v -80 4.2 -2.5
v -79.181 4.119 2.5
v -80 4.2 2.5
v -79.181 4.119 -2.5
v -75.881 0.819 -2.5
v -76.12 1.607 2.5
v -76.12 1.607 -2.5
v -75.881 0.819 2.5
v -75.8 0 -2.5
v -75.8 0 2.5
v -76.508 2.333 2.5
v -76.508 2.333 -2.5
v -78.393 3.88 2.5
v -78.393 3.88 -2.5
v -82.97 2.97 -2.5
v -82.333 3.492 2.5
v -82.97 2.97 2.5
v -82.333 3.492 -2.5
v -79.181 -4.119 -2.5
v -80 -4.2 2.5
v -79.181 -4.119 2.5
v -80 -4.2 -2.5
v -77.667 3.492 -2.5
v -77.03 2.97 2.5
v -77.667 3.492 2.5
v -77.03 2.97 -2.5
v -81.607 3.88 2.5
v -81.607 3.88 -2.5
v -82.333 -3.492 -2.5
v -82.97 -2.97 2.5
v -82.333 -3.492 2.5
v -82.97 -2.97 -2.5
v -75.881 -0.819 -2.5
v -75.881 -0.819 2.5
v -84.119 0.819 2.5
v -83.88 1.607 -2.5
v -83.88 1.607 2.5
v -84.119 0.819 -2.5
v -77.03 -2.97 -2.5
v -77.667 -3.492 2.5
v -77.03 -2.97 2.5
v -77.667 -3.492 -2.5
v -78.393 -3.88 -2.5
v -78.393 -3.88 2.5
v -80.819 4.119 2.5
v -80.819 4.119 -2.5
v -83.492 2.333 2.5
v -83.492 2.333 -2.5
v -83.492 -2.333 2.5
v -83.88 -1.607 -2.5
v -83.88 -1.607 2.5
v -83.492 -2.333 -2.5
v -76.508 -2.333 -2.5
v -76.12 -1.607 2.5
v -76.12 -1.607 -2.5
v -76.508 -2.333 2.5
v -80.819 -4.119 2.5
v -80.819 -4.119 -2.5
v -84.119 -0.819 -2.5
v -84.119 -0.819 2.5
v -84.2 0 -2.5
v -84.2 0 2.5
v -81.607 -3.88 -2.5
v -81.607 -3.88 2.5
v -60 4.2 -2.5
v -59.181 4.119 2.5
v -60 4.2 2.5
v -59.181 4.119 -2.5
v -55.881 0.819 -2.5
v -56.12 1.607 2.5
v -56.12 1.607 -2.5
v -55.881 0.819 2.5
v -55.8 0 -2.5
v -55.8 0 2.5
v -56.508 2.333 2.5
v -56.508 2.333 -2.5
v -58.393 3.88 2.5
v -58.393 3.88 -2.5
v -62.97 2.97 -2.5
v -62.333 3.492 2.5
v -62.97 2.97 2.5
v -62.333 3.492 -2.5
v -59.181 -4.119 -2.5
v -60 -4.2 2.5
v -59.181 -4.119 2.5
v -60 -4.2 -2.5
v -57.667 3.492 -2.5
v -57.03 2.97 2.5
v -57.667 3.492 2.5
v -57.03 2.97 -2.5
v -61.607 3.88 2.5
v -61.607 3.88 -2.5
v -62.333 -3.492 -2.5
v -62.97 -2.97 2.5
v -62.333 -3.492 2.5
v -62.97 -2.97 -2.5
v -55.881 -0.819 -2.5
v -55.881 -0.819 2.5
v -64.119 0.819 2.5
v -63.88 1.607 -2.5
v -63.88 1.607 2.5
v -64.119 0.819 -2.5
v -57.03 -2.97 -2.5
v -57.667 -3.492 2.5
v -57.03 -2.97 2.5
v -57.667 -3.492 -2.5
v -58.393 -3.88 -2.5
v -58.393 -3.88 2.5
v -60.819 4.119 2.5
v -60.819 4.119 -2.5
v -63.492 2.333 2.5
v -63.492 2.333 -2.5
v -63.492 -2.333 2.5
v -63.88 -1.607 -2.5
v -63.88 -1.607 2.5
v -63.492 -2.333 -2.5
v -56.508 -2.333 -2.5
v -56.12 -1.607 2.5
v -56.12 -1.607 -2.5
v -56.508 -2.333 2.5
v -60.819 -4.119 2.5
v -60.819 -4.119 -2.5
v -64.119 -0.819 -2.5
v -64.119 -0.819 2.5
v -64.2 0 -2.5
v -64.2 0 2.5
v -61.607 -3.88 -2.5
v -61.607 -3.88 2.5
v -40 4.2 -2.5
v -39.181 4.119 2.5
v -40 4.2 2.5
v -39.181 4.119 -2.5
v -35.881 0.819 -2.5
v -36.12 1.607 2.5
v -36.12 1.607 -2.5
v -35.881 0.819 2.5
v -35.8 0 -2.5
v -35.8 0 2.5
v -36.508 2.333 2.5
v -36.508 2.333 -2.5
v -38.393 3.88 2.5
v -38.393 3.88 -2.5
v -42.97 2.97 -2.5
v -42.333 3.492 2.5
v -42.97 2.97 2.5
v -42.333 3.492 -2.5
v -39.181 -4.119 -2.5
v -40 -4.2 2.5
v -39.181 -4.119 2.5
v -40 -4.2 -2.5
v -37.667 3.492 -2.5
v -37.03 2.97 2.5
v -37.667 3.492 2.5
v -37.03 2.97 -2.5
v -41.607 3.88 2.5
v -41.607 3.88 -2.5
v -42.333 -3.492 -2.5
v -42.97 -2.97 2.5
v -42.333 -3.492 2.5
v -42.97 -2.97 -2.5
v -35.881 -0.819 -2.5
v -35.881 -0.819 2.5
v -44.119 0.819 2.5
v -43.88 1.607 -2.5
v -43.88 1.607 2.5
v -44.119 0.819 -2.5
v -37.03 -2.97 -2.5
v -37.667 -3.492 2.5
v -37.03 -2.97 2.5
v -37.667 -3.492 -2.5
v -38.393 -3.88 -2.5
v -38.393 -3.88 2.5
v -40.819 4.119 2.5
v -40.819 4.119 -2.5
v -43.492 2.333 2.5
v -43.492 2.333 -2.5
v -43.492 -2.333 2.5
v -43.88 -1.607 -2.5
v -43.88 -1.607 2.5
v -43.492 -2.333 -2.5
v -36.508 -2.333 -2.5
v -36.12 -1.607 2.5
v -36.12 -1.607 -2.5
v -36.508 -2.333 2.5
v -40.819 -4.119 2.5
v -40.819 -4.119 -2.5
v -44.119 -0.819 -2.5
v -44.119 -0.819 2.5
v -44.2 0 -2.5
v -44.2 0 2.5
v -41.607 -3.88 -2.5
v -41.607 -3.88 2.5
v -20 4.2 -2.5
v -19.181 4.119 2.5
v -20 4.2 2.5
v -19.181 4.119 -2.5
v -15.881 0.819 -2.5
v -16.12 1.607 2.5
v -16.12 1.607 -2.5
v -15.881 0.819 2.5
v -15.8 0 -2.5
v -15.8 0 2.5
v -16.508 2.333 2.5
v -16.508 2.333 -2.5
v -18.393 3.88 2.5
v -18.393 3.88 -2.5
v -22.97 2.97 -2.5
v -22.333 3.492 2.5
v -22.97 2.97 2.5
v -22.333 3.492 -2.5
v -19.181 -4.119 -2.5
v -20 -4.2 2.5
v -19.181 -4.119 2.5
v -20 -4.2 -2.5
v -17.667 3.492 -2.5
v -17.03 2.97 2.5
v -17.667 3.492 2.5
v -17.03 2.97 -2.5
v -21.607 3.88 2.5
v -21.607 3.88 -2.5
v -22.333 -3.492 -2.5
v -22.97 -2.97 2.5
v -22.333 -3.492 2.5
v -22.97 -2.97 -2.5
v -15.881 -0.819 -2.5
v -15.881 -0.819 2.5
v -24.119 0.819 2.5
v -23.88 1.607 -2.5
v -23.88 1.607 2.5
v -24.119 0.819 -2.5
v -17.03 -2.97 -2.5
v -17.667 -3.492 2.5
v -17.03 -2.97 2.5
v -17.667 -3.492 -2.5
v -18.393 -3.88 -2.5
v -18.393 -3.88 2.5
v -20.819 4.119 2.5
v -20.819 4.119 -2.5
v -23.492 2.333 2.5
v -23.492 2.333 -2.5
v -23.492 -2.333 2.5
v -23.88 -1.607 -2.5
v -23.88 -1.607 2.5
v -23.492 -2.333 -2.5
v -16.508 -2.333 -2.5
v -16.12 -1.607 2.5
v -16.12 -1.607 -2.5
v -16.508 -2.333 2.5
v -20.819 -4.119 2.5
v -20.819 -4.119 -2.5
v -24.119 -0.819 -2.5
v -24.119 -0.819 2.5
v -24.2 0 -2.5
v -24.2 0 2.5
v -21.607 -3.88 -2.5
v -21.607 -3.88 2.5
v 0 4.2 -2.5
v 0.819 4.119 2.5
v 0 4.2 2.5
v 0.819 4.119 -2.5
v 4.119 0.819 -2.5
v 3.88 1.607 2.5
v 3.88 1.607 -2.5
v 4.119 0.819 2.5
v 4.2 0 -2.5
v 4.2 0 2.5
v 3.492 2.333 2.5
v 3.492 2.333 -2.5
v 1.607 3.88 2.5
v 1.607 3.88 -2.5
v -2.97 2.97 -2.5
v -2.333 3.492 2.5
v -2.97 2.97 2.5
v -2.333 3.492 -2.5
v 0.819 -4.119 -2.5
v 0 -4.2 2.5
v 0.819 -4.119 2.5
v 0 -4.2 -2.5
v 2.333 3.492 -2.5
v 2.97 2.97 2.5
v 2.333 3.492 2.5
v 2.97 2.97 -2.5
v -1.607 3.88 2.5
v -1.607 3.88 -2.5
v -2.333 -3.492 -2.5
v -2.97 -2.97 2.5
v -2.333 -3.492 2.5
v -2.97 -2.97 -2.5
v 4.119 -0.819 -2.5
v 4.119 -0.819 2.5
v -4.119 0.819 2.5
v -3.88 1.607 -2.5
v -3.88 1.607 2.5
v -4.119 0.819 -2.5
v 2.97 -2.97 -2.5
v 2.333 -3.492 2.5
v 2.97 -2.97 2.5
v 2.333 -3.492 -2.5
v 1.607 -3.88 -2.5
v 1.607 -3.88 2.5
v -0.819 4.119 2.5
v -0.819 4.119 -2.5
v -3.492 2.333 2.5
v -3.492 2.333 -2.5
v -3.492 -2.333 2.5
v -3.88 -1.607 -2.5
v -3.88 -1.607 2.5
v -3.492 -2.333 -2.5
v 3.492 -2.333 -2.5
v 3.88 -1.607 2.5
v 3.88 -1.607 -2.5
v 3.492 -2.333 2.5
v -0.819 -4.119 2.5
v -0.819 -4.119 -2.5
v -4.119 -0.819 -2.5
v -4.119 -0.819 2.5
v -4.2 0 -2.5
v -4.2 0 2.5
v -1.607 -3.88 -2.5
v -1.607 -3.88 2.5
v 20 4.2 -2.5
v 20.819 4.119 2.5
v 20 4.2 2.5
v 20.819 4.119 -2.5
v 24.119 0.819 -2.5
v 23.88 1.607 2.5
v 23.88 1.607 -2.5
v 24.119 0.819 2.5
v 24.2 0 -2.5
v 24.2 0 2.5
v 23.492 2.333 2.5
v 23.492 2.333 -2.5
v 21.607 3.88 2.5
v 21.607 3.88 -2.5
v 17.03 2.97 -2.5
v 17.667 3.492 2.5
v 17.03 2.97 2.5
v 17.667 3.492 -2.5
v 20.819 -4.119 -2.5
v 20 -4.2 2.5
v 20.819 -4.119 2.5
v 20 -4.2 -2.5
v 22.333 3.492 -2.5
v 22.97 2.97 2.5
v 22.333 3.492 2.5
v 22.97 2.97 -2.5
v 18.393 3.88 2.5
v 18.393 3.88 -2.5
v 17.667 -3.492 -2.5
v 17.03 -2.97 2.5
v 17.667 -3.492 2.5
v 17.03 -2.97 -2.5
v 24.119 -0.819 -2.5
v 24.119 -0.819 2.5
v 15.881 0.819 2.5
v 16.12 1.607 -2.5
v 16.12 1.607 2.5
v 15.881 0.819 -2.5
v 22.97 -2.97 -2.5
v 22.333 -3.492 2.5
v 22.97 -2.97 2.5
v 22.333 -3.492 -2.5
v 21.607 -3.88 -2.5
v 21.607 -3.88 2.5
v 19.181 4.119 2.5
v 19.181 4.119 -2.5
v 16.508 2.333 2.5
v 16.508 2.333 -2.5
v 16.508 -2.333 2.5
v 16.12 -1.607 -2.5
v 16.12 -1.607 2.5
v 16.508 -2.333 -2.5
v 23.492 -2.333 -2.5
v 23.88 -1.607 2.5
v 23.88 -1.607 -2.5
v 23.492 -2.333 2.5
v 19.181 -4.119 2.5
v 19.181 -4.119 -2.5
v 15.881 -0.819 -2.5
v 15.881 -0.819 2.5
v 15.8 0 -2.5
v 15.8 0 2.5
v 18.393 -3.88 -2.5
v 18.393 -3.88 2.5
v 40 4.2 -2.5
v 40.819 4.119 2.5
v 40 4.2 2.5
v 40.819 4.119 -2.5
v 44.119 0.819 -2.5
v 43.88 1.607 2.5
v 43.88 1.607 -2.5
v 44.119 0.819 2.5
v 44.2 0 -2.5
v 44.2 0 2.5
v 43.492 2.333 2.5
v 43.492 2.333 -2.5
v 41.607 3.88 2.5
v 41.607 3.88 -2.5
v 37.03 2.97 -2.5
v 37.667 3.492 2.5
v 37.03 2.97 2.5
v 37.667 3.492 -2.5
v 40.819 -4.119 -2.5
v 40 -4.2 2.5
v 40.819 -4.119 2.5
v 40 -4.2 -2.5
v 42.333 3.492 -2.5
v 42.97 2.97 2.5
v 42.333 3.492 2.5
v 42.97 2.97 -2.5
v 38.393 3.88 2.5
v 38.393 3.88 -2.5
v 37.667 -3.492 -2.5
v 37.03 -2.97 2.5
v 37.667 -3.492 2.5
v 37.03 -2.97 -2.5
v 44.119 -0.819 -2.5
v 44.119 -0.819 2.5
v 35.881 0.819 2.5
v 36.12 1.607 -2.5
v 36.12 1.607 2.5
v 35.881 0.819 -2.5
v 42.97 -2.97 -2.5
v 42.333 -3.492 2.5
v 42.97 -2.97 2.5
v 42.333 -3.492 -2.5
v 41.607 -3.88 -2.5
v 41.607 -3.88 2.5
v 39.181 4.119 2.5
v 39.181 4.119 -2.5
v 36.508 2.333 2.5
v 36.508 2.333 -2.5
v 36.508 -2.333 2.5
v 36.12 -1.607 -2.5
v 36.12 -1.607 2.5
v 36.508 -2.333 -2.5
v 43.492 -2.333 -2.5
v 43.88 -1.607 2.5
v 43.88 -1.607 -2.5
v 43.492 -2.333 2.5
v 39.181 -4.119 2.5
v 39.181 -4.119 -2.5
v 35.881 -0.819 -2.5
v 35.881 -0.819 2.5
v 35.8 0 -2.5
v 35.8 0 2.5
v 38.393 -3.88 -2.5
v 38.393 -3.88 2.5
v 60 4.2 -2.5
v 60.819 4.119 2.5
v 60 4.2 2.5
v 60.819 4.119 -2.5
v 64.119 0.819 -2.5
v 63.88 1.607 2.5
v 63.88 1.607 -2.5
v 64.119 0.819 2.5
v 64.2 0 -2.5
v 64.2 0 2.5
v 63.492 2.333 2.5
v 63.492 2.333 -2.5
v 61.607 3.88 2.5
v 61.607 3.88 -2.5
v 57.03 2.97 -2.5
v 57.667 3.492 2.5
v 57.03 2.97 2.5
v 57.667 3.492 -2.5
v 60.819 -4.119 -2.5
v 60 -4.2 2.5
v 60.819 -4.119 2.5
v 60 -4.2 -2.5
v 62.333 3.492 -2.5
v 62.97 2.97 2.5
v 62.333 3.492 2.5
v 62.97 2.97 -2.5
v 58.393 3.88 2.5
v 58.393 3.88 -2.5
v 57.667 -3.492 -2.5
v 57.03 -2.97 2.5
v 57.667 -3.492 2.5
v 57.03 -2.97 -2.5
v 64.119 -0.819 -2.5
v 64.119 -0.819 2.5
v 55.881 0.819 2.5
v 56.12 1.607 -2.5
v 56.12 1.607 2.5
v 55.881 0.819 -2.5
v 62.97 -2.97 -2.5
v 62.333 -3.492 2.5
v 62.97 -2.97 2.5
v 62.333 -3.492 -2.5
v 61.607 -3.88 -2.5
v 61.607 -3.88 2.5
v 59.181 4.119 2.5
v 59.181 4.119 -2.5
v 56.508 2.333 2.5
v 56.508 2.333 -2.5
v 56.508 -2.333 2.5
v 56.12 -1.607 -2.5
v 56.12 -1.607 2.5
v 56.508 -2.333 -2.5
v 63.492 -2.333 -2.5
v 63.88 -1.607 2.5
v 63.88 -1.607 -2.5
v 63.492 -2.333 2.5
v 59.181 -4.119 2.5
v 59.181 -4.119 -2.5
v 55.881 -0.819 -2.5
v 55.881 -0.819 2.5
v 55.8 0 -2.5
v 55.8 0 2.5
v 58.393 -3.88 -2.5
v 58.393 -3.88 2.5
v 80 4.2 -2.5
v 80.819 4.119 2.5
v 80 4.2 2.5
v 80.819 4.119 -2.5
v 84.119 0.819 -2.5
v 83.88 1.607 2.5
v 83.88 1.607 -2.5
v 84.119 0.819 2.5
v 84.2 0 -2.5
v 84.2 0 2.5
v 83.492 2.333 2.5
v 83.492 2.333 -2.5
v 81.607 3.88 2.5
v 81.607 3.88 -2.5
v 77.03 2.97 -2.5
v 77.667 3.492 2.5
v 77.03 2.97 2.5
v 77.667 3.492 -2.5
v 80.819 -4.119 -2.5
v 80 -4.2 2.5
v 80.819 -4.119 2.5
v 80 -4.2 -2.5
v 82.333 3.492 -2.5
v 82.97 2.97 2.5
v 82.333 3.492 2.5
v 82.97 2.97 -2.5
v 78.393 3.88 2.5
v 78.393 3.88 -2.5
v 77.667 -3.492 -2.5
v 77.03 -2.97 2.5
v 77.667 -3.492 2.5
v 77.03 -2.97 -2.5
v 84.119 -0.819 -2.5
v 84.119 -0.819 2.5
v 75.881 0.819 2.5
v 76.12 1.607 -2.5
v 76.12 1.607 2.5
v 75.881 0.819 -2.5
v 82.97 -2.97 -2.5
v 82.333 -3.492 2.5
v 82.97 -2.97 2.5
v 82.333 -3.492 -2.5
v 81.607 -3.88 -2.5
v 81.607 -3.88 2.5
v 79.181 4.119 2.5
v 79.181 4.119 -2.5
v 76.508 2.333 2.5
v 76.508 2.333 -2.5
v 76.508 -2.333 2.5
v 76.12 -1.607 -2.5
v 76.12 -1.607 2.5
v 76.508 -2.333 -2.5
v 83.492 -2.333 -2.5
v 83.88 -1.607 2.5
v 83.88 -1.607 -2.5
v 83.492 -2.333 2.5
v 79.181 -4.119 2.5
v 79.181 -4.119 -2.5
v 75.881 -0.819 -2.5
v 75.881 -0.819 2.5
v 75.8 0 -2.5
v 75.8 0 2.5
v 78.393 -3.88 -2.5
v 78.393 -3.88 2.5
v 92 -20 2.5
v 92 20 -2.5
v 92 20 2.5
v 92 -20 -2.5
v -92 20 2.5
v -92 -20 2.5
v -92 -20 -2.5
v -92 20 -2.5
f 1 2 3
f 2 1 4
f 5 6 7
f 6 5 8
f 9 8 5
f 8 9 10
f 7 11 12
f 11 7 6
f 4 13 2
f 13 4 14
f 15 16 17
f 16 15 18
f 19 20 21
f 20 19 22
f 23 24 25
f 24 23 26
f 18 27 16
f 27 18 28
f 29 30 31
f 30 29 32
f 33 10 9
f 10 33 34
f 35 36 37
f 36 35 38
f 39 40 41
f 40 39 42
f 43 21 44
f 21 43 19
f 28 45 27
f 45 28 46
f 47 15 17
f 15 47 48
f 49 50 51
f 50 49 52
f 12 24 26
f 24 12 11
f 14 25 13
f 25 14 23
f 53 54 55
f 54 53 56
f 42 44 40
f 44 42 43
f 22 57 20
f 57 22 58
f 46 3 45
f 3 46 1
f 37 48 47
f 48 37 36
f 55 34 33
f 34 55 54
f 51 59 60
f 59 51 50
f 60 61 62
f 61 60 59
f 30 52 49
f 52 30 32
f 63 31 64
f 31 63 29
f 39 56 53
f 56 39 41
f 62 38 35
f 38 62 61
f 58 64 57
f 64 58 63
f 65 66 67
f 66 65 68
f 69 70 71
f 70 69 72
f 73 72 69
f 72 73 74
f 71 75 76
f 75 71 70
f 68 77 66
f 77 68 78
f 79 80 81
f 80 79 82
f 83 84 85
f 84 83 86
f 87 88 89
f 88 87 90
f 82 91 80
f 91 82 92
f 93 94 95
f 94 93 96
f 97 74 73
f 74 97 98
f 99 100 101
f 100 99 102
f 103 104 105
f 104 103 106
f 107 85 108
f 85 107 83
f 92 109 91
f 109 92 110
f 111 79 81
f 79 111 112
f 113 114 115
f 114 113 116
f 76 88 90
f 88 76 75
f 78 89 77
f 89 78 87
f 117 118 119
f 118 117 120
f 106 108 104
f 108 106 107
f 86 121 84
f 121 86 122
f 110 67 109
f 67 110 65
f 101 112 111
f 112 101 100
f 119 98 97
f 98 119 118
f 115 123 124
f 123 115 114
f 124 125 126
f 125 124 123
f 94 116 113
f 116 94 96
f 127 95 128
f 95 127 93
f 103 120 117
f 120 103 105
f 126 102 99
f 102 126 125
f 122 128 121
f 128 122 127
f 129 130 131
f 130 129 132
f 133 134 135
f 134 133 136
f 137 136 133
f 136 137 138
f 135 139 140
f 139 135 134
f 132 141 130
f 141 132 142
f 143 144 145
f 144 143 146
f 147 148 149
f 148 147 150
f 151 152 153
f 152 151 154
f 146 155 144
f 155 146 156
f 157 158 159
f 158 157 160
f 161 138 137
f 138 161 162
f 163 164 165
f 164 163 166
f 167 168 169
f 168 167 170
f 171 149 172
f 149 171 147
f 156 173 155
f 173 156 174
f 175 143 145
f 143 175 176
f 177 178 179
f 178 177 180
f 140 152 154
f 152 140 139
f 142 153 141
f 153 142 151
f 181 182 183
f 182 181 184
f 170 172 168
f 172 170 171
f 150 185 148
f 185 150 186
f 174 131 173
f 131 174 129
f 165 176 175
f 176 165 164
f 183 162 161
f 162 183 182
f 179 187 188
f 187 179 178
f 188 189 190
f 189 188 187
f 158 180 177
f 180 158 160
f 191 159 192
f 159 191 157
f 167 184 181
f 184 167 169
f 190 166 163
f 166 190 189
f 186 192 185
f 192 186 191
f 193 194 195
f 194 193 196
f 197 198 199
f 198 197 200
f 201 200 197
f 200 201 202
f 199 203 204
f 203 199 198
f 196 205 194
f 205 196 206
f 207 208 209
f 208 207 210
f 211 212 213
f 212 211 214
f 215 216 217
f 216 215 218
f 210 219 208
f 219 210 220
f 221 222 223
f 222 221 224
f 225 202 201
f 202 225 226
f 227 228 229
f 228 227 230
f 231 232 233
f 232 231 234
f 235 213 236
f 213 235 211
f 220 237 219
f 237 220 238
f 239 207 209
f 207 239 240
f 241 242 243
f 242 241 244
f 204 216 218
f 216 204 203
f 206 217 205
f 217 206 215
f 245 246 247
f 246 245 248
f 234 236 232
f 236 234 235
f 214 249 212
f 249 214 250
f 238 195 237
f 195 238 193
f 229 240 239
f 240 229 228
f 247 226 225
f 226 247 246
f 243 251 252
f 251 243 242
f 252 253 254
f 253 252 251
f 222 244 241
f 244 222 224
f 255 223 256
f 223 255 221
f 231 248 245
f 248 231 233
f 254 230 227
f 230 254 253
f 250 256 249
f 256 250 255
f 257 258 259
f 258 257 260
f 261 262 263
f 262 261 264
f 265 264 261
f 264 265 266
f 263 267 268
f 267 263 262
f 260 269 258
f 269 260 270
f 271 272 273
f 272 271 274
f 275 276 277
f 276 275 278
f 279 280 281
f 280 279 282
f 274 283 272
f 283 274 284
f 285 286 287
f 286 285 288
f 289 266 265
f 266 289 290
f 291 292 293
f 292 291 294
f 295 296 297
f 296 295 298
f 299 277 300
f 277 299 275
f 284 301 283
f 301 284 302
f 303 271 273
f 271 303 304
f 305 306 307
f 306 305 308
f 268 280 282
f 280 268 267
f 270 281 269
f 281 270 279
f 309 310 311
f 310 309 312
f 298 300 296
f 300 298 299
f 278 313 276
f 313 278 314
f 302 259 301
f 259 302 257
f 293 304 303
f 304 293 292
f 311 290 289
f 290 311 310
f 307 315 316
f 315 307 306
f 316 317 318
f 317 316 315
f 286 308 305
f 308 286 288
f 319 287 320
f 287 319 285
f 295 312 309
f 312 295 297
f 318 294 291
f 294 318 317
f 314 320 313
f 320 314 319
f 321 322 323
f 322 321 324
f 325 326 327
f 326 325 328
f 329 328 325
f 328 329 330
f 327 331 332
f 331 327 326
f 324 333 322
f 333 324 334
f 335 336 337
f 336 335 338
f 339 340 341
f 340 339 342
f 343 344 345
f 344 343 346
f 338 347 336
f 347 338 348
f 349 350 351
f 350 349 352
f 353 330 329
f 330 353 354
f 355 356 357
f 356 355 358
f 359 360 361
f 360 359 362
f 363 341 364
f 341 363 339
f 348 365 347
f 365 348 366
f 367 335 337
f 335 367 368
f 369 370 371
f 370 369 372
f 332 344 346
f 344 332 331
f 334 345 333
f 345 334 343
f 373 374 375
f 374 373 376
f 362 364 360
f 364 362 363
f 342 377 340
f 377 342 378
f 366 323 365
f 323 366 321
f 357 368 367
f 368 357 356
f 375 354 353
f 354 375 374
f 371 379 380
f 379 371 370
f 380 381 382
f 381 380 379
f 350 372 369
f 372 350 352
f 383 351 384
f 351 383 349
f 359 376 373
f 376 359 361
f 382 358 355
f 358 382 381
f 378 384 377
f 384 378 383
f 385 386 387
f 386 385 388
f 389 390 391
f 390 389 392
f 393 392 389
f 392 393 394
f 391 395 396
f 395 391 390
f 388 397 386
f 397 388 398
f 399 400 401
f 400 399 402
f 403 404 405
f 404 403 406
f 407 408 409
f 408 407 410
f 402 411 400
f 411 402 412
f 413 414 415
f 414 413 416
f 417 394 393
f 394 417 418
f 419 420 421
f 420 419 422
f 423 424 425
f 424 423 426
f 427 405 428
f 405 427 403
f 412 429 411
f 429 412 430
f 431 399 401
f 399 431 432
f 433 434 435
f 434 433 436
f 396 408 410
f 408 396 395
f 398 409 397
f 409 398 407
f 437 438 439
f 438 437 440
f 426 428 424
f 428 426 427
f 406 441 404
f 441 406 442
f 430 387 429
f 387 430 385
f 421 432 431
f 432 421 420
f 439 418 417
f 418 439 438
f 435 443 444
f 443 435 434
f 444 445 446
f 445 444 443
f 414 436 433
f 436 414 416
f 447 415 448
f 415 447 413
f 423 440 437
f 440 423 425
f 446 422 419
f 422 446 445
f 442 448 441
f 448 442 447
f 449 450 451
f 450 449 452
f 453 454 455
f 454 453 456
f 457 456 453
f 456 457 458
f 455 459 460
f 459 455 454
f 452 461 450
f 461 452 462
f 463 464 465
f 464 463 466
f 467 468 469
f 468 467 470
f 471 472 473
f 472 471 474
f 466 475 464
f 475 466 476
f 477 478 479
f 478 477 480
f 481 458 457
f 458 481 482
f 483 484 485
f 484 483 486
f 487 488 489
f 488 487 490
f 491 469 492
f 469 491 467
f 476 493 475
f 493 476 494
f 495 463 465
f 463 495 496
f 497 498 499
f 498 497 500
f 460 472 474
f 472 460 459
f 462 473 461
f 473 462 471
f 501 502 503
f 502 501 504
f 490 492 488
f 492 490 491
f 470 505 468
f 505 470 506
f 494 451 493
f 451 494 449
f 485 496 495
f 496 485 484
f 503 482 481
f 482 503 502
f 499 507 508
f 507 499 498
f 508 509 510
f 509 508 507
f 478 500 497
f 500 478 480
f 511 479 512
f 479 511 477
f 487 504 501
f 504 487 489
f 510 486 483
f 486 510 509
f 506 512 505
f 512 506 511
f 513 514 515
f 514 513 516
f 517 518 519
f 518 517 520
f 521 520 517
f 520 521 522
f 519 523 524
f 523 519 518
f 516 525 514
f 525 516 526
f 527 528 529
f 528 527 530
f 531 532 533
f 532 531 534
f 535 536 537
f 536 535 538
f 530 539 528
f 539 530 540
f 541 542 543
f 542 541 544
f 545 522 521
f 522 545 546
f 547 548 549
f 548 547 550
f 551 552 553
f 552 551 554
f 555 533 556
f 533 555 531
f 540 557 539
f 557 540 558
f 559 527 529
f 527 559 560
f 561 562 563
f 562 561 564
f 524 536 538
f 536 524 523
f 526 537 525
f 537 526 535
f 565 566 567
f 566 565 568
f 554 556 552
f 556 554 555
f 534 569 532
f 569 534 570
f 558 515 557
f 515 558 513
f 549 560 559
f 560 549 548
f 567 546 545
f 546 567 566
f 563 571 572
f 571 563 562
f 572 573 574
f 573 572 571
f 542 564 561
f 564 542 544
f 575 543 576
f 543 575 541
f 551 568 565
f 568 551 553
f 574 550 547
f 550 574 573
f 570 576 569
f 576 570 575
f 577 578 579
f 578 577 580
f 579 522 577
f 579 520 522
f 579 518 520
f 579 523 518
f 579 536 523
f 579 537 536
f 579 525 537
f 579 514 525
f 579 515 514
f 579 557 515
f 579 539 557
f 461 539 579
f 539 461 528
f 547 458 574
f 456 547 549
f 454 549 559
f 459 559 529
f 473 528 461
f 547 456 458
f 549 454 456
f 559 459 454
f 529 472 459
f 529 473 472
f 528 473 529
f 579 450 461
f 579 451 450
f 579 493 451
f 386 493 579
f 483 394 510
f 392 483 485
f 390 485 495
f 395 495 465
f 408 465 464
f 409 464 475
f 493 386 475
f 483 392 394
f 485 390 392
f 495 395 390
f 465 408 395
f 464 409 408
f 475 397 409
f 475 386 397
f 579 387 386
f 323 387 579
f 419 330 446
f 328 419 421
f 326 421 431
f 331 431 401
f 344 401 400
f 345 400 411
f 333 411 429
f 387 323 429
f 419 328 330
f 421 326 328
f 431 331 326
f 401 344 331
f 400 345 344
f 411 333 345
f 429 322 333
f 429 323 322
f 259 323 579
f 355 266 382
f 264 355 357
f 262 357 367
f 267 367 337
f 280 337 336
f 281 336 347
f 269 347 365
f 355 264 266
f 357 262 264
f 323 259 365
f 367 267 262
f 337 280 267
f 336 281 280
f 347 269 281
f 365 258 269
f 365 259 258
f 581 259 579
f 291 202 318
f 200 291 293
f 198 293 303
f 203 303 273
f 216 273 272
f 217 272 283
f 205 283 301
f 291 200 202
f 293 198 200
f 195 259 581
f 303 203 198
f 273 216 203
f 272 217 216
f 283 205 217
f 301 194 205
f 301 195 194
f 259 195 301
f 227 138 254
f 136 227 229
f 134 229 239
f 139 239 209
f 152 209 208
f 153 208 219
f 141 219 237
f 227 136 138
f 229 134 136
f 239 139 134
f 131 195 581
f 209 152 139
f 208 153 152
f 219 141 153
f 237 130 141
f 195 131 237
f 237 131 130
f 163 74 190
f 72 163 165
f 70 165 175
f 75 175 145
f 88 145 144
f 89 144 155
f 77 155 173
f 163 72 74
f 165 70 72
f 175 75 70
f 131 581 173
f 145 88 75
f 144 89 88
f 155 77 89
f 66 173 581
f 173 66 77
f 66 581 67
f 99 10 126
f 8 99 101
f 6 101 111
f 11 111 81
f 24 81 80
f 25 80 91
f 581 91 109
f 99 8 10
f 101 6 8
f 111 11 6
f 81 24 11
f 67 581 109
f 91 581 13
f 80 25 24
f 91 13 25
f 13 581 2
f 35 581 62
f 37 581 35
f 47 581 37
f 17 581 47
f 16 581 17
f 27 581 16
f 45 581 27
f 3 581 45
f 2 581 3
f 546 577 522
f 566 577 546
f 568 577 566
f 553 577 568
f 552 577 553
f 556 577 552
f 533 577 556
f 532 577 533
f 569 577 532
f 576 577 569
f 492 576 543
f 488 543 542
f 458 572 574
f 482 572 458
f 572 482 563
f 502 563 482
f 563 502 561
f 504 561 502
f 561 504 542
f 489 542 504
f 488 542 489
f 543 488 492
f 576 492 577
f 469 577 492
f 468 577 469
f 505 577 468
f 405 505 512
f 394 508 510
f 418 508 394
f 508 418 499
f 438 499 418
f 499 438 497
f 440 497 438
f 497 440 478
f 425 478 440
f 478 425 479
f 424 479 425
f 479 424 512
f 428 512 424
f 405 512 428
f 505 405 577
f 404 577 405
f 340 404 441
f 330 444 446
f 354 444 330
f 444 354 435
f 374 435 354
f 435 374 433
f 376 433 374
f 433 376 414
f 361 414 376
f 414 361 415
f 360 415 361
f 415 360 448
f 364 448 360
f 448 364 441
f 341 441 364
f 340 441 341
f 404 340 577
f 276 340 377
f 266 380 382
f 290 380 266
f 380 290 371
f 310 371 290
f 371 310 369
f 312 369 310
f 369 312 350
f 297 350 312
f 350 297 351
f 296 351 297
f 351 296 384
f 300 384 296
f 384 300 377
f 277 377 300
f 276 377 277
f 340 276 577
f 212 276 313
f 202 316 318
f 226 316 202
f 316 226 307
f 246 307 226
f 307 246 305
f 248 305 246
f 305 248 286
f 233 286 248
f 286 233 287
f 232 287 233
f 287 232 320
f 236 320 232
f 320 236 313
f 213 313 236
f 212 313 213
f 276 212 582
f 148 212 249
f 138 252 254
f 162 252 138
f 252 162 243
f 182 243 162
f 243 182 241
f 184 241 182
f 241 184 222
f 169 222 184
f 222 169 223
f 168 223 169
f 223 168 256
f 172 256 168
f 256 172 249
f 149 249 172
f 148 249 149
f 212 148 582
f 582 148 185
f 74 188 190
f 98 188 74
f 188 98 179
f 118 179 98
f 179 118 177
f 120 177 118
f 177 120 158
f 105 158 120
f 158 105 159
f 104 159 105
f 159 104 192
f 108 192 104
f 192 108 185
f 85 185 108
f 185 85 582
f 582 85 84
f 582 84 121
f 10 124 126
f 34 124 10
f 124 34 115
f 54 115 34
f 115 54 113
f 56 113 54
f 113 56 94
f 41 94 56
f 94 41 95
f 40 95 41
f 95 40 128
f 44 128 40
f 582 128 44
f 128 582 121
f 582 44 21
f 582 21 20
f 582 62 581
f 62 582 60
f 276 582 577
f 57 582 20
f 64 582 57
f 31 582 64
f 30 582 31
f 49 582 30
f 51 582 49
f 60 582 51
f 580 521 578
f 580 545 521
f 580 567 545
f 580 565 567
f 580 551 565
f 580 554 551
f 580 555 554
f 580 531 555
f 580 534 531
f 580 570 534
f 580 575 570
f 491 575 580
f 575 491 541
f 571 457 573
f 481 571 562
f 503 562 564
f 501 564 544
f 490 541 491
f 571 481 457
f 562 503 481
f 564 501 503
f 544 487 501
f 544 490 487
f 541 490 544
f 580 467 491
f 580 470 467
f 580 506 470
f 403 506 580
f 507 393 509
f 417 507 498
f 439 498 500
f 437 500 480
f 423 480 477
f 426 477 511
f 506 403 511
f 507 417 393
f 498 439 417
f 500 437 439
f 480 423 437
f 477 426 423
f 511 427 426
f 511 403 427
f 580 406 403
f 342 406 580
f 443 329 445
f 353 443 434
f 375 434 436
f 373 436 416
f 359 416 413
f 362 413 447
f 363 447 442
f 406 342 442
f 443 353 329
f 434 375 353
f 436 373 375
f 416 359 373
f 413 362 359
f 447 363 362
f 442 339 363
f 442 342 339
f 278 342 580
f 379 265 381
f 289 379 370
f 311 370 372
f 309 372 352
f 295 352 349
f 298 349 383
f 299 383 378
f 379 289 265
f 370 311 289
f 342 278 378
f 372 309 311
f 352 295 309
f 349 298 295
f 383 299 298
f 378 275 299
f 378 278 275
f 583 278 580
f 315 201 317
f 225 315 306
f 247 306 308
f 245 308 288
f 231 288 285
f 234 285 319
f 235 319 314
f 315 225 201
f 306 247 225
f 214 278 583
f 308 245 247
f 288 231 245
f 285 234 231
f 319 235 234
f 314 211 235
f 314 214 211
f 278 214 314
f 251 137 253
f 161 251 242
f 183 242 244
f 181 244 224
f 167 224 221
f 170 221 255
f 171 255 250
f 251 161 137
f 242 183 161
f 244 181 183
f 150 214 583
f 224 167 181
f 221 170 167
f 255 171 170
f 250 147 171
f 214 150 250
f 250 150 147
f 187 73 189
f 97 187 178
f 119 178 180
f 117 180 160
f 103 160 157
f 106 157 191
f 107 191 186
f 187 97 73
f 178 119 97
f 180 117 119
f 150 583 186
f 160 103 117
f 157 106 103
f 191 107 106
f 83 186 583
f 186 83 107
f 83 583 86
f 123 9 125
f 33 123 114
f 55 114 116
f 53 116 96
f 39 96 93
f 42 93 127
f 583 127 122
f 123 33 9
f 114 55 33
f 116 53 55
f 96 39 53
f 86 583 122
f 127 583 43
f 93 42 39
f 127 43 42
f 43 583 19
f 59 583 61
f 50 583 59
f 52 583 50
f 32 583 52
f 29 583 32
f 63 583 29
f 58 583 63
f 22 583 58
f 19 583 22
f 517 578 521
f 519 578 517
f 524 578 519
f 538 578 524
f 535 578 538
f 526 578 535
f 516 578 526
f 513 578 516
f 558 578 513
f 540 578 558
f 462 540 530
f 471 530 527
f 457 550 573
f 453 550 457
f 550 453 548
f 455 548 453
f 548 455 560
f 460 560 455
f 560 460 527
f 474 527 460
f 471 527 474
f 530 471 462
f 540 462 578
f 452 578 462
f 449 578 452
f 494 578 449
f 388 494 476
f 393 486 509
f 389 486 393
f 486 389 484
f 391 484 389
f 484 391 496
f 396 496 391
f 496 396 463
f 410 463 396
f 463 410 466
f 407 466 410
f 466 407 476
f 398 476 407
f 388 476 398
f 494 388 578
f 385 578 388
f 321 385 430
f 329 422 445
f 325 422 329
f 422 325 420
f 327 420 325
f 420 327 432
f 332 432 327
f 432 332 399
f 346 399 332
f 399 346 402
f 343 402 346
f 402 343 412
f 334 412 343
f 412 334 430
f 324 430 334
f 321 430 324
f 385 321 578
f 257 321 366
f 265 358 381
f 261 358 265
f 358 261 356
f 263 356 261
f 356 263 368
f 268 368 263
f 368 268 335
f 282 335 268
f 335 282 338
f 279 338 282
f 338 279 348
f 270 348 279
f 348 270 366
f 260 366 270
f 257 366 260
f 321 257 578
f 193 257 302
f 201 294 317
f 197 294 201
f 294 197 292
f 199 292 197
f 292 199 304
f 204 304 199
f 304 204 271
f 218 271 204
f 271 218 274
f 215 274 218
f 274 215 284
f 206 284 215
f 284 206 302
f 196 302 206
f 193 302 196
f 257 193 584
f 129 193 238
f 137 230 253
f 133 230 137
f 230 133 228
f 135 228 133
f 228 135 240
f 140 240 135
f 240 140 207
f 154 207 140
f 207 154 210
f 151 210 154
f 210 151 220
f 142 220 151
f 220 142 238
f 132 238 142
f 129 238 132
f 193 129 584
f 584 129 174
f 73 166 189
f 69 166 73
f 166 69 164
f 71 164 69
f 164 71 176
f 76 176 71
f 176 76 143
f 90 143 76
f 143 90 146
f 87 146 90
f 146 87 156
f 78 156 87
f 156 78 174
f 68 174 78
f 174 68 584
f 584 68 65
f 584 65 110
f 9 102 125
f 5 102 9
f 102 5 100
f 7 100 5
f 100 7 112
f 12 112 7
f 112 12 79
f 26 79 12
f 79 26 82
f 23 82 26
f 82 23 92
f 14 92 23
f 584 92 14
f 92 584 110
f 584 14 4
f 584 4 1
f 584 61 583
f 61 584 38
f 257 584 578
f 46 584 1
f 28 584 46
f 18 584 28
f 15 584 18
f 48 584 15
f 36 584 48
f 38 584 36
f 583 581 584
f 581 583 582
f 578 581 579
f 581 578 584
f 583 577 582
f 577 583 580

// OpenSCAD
$fn = 32;

// ----------------------------------------------------------------------
// Hole bar, 9 x Ø8.4
// row layout, 12 mm edge offset
// ----------------------------------------------------------------------

// --- parameters (mm) ---
bar_w = 40;    // bar width (Y)
bar_t = 5;     // bar thickness (Z)
holes = 9;     // holes per row
hole_d = 8.4;  // hole diameter
edge = 12;     // offset from the bar end to the first hole
pitch = 20;    // pitch between neighbouring holes

// --- derived feature positions (mm) ---
span = (holes - 1) * pitch;   // = 160   distance between the end holes
bar_l = span + 2 * edge;      // = 184   overall bar length
start_x = -bar_l / 2 + edge;  // = -80   X of the first hole
feature_centers = [
  [start_x + 0 * pitch, 0],
  [start_x + 1 * pitch, 0],
  [start_x + 2 * pitch, 0],
  [start_x + 3 * pitch, 0],
  [start_x + 4 * pitch, 0],
  [start_x + 5 * pitch, 0],
  [start_x + 6 * pitch, 0],
  [start_x + 7 * pitch, 0],
  [start_x + 8 * pitch, 0]
];   // hole centres of the first row

// bar with one row of holes, drilled from feature_centers
difference() {
  translate([-bar_l / 2, -bar_w / 2, -bar_t / 2]) cube([bar_l, bar_w, bar_t]);
  for (centre = feature_centers)
    translate([centre[0], centre[1], 0])
      cylinder(d = hole_d, h = bar_t + 2, center = true);
}
